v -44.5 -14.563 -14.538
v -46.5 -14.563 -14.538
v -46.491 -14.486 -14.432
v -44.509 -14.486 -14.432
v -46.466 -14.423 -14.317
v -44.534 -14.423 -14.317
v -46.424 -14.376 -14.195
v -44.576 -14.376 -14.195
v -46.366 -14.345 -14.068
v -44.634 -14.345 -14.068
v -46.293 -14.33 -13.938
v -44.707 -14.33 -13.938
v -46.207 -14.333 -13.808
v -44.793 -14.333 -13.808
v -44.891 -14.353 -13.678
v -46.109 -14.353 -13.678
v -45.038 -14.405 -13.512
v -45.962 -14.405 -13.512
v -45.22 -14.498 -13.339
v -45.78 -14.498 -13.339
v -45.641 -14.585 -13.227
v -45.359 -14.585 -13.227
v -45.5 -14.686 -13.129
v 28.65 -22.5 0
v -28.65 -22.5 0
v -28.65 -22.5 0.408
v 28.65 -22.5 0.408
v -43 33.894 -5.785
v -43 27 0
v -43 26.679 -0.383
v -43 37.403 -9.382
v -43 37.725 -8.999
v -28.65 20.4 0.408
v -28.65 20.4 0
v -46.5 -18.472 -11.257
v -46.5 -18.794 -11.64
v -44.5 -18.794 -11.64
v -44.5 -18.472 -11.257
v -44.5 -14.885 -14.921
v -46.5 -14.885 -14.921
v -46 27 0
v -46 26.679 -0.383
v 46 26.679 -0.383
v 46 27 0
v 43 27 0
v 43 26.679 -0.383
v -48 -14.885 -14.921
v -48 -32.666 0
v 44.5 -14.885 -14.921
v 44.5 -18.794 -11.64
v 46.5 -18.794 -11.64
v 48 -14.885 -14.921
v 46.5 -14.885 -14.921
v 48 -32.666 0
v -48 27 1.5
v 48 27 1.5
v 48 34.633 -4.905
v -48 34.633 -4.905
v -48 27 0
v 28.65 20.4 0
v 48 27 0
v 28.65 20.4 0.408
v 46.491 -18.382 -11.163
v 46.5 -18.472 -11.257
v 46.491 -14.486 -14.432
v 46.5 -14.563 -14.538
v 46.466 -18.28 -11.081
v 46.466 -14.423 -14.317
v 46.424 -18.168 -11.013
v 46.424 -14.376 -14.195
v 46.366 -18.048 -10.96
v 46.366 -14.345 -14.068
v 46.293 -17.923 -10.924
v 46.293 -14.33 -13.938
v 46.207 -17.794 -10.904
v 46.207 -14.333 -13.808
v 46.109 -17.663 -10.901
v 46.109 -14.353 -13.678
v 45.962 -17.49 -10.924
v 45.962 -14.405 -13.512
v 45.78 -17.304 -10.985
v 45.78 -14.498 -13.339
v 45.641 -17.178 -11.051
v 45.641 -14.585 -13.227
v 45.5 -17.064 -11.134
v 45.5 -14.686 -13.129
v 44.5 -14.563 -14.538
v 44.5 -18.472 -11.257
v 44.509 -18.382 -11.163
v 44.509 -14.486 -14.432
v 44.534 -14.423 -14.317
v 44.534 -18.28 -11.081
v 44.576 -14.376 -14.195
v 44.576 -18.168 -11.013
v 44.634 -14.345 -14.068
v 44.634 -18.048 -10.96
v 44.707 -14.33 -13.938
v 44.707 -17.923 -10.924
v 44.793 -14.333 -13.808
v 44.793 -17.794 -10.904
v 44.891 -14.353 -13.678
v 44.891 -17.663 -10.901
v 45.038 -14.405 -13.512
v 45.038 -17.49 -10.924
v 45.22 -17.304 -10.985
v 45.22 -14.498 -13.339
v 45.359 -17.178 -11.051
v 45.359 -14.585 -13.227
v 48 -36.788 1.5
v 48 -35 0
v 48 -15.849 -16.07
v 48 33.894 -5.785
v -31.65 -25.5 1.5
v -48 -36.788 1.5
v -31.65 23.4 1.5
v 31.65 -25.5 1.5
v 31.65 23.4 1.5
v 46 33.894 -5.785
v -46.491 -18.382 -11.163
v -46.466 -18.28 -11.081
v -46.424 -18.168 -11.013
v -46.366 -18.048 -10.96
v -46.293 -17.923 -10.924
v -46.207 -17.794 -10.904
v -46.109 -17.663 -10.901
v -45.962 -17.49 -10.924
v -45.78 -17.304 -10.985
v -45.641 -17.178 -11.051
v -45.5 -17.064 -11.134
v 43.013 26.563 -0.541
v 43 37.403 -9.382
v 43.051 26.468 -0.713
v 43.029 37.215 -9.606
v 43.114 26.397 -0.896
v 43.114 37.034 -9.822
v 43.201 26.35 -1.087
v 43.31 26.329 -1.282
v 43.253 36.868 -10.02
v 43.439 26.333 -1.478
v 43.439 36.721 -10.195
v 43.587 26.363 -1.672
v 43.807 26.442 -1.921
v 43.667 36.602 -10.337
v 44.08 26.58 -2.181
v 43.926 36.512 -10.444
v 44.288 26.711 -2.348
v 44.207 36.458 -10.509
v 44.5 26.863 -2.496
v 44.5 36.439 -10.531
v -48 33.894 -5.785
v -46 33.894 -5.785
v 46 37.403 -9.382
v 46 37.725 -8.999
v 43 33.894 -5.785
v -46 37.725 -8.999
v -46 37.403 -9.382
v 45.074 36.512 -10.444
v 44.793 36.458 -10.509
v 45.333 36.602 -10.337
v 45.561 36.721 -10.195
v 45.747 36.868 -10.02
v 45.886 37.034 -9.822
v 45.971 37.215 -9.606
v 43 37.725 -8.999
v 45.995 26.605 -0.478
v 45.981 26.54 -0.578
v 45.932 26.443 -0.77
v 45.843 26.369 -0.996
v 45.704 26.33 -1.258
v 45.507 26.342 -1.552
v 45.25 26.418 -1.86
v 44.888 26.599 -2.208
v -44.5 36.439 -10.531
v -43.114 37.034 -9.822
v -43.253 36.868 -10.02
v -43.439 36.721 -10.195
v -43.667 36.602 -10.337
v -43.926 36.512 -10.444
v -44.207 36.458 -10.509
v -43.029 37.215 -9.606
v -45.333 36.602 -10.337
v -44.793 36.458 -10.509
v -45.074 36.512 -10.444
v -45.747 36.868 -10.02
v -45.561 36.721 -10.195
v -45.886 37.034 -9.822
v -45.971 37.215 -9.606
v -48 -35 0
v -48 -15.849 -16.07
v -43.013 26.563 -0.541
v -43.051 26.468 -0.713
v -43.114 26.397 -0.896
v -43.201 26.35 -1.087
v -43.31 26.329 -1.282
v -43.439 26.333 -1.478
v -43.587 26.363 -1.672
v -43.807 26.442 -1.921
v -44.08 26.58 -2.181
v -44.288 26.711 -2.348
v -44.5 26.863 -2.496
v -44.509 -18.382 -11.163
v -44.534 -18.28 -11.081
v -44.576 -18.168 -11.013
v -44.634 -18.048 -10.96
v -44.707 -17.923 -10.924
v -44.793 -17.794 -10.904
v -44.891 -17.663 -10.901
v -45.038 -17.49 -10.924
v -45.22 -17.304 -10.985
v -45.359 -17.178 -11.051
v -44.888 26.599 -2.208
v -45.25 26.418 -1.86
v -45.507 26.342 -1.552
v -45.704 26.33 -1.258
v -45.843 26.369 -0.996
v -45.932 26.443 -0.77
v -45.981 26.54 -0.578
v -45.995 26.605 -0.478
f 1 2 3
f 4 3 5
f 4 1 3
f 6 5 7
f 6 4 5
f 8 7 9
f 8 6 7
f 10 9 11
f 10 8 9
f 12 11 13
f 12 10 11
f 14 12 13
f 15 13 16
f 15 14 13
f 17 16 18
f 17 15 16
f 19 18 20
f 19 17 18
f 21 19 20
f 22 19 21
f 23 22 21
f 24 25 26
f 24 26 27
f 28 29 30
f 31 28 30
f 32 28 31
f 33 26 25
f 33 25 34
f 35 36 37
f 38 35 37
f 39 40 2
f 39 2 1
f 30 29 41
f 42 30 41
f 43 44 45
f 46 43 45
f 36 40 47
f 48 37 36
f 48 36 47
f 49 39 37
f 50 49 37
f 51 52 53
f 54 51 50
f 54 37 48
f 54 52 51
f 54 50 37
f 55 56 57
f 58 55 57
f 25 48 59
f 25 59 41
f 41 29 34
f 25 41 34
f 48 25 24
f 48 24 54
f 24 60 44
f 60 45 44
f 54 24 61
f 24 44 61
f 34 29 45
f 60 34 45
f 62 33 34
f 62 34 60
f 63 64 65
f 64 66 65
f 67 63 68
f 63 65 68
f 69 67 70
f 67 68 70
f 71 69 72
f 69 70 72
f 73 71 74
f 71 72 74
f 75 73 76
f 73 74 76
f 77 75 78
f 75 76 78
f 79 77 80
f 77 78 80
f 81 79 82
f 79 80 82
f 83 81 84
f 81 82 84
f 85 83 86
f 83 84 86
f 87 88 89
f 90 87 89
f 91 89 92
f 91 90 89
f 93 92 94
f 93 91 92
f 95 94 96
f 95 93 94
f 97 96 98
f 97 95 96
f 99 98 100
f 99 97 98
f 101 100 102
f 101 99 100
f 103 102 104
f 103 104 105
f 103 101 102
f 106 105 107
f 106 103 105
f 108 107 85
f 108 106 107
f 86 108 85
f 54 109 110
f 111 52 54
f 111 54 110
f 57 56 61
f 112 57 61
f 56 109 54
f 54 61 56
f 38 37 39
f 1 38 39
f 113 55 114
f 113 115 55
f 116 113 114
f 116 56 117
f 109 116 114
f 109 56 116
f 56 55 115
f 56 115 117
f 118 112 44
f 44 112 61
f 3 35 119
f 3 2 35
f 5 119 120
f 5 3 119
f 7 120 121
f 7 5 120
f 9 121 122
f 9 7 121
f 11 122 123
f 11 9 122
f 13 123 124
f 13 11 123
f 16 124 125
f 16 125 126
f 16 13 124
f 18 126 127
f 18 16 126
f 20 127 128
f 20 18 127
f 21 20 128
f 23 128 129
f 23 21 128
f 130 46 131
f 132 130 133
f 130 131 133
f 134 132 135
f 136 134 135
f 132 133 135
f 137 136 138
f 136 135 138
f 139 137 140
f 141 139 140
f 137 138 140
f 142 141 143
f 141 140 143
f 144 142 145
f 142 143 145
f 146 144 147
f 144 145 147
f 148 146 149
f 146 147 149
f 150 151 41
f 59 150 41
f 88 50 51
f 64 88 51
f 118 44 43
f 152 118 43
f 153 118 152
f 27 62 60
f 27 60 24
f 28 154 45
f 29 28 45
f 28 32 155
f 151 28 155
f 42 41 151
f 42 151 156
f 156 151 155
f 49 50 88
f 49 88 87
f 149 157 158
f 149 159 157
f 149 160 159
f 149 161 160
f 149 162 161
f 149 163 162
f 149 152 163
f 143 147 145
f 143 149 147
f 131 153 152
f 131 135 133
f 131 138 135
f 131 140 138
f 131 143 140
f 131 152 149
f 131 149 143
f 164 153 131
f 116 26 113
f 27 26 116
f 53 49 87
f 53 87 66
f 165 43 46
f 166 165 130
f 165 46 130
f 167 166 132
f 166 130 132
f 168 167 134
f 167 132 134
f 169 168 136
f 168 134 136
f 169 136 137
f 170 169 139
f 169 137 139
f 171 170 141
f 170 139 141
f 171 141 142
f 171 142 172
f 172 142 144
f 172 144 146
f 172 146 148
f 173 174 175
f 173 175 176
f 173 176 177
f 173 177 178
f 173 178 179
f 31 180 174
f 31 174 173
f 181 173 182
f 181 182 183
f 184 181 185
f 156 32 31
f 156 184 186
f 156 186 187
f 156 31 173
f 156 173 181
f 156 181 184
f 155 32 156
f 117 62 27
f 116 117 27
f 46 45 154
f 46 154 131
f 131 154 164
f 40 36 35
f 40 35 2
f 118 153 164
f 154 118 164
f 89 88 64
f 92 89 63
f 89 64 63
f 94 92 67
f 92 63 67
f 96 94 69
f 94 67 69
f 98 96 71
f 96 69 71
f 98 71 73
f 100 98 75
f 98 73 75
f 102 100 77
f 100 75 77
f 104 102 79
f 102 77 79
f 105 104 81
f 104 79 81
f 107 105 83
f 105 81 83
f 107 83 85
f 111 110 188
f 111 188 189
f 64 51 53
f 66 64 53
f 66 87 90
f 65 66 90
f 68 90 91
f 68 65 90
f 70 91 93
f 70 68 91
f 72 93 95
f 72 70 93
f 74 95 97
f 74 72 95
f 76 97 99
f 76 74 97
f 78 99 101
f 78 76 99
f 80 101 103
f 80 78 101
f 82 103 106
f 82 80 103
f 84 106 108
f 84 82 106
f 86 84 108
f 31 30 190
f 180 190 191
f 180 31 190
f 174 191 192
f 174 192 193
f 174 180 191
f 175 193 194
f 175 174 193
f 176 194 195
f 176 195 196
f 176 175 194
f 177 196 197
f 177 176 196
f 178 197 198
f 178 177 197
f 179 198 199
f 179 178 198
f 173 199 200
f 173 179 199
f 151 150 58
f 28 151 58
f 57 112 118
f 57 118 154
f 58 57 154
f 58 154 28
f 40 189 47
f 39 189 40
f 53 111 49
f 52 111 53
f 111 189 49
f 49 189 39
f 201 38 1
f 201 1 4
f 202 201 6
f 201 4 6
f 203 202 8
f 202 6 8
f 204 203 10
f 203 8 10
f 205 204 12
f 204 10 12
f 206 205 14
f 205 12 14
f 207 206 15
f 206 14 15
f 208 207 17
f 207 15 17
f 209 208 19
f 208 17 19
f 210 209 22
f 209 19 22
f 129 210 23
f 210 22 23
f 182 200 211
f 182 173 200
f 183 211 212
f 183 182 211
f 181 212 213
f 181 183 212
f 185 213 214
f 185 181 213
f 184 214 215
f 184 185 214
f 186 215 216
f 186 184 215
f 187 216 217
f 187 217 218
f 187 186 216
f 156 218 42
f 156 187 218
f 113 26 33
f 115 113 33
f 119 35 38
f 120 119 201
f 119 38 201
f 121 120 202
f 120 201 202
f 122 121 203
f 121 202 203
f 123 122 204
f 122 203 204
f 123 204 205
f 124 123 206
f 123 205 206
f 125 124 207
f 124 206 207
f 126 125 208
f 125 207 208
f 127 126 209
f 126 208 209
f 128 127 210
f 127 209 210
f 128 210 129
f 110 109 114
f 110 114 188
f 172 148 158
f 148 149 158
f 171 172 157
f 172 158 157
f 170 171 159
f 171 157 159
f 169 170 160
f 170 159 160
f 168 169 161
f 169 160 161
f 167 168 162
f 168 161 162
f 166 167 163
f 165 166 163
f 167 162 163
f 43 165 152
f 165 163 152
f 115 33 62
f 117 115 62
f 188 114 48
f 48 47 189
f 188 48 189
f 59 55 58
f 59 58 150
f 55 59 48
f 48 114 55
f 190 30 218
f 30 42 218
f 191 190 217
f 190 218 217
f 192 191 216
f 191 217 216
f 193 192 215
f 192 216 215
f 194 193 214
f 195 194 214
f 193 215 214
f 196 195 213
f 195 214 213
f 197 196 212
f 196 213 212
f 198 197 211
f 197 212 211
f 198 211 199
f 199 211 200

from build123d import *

# Parameters (mm, degrees)
SKETCH_1_W          = 60
SKETCH_1_H          = 45
EXTRUDE_1_DEPTH     = 1.5
EXTRUDE_2_DEPTH     = 96
SKETCH_4_W          = 60
SKETCH_4_H          = 2.1
EXTRUDE_3_DEPTH     = 1.5
EXTRUDE_4_DEPTH     = 1.5
CUT_EXTRUDE_2_DEPTH = 100
EXTRUDE_5_DEPTH     = 96
SKETCH_12_W         = 3
SKETCH_12_H         = 14
EXTRUDE_6_DEPTH     = 2
FILLET_1_R          = 1.5
SKETCH_13_W         = 2
SKETCH_13_H         = 5.103076436
EXTRUDE_7_DEPTH     = 1.5
FILLET_3_R          = 1
CHAMFER_3_SIZE      = 3
CHAMFER_3_SIZE2     = 1.091910703


with BuildPart() as part:
    # Эскиз1 → Бобышка-Вытянуть1 (new body)
    with BuildSketch(Plane.XY):
        Polygon((46, -35), (-46, -35), (-48, -35), (-48, -25), (-48, 25), (-48, 27), (-46, 27), (46, 27), (48, 27), (48, 25), (48, -25), (48, -35), align=None)
        Rectangle(SKETCH_1_W, SKETCH_1_H, mode=Mode.SUBTRACT)
    extrude(amount=EXTRUDE_1_DEPTH)

    # Эскиз2 → Бобышка-Вытянуть2 (add)
    with BuildSketch(Plane(origin=(48, 0, 0), x_dir=(0, 0, -1), z_dir=(1, 0, 0))):
        Polygon((8.78785553, 39.260588787), (9.668091663, 38.521982973), (0, 27), (-1.5, 27), align=None)
        Polygon((0, -32.66641426), (0, -35), (16.069690242, -15.848888922), (14.920623577, -14.884707507), align=None)
    extrude(amount=-EXTRUDE_2_DEPTH)

    # Эскиз4 → Бобышка-Вытянуть3 (add)
    with BuildSketch(Plane.XY.offset(1.5)):
        with Locations((0, 21.45)):
            Rectangle(SKETCH_4_W, SKETCH_4_H)
    extrude(amount=-EXTRUDE_3_DEPTH)

    # Эскиз6 → Бобышка-Вытянуть4 (add)
    with BuildSketch(Plane.XY.offset(1.5)):
        Polygon((-28.65, -20.7), (-28.65, 20.4), (-30, 20.4), (-30, -22.5), (-28.65, -22.5), align=None)
        Polygon((28.65, 20.4), (28.65, -20.7), (28.65, -22.5), (30, -22.5), (30, 20.4), align=None)
    extrude(amount=-EXTRUDE_4_DEPTH)

    # Эскиз8 → Вырез-Вытянуть2 (cut)
    with BuildSketch(Plane(origin=(48, 0, 0), x_dir=(0, 0, -1), z_dir=(1, 0, 0))):
        Polygon((5.785088487, 33.894399988), (4.904852354, 34.633005803), (8.78785553, 39.260588787), (9.668091663, 38.521982973), align=None)
    extrude(amount=-CUT_EXTRUDE_2_DEPTH, mode=Mode.SUBTRACT)

    # Эскиз9 → Бобышка-Вытянуть5 (add)
    with BuildSketch(Plane(origin=(48, 0, 0), x_dir=(0, 0, -1), z_dir=(1, 0, 0))):
        Polygon((-1.5, -35), (-1.5, -36.787630389), (0, -35), align=None)
    extrude(amount=-EXTRUDE_5_DEPTH)

    # Эскиз12 → Бобышка-Вытянуть6 (add)
    with BuildSketch(Plane(origin=(0, 11.155749601, 13.294904666), x_dir=(-1, 0, 0), z_dir=(0, -0.6427876096865351, -0.7660444431189816))):
        with Locations((44.5, 27.683199964)):
            Rectangle(SKETCH_12_W, SKETCH_12_H)
        with Locations((-44.5, 27.683199964)):
            Rectangle(SKETCH_12_W, SKETCH_12_H)
    extrude(amount=EXTRUDE_6_DEPTH)

    # Скругление1
    fillet_1_edges = [part.edges().sort_by_distance(p)[0] for p in [
        (-43, 31.076735882, -6.031602154),
        (-46, 31.076735882, -6.031602154),
        (-44.5, 25.714424781, -1.532088886),
        (46, 31.076735882, -6.031602154),
        (43, 31.076735882, -6.031602154),
        (44.5, 25.714424781, -1.532088886),
    ]]
    fillet(fillet_1_edges, radius=FILLET_1_R - 0.0001)  # a hair under: the kernel refuses the full size

    # Эскиз13 → Бобышка-Вытянуть7 (add)
    with BuildSketch(Plane(origin=(0, -13.496975476, -16.085069013), x_dir=(1, 0, 0), z_dir=(0, 0.642787609686538, 0.7660444431189792))):
        with Locations((-45.5, -4.363093727)):
            Rectangle(SKETCH_13_W, SKETCH_13_H)
        with Locations((45.5, -4.363093727)):
            Rectangle(SKETCH_13_W, SKETCH_13_H)
    extrude(amount=EXTRUDE_7_DEPTH)

    # Скругление3
    fillet_3_edges = [part.edges().sort_by_distance(p)[0] for p in [
        (-46.5, -15.875117766, -12.131459761),
        (-45.5, -17.82970944, -10.491362608),
        (-44.5, -15.875117766, -12.131459761),
        (-45.5, -13.920526093, -13.771556913),
        (45.5, -13.920526093, -13.771556913),
        (44.5, -15.875117766, -12.131459761),
        (45.5, -17.82970944, -10.491362608),
        (46.5, -15.875117766, -12.131459761),
    ]]
    fillet(fillet_3_edges, radius=FILLET_3_R - 0.0001)  # a hair under: the kernel refuses the full size

    # Фаска3
    chamfer_3_edges = [part.edges().sort_by_distance(p)[0] for p in [
        (28.65, -1.05, 1.5),
        (0, 20.4, 1.5),
        (0, -22.5, 1.5),
        (-28.65, -1.05, 1.5),
    ]]
    chamfer_3_side = [part.faces().sort_by_distance(p)[0] for p in [
        (-46.847400252, -4.893815194, 1.5),
    ]]
    chamfer(chamfer_3_edges, length=CHAMFER_3_SIZE, length2=CHAMFER_3_SIZE2, reference=chamfer_3_side[0])


solid = part.part
